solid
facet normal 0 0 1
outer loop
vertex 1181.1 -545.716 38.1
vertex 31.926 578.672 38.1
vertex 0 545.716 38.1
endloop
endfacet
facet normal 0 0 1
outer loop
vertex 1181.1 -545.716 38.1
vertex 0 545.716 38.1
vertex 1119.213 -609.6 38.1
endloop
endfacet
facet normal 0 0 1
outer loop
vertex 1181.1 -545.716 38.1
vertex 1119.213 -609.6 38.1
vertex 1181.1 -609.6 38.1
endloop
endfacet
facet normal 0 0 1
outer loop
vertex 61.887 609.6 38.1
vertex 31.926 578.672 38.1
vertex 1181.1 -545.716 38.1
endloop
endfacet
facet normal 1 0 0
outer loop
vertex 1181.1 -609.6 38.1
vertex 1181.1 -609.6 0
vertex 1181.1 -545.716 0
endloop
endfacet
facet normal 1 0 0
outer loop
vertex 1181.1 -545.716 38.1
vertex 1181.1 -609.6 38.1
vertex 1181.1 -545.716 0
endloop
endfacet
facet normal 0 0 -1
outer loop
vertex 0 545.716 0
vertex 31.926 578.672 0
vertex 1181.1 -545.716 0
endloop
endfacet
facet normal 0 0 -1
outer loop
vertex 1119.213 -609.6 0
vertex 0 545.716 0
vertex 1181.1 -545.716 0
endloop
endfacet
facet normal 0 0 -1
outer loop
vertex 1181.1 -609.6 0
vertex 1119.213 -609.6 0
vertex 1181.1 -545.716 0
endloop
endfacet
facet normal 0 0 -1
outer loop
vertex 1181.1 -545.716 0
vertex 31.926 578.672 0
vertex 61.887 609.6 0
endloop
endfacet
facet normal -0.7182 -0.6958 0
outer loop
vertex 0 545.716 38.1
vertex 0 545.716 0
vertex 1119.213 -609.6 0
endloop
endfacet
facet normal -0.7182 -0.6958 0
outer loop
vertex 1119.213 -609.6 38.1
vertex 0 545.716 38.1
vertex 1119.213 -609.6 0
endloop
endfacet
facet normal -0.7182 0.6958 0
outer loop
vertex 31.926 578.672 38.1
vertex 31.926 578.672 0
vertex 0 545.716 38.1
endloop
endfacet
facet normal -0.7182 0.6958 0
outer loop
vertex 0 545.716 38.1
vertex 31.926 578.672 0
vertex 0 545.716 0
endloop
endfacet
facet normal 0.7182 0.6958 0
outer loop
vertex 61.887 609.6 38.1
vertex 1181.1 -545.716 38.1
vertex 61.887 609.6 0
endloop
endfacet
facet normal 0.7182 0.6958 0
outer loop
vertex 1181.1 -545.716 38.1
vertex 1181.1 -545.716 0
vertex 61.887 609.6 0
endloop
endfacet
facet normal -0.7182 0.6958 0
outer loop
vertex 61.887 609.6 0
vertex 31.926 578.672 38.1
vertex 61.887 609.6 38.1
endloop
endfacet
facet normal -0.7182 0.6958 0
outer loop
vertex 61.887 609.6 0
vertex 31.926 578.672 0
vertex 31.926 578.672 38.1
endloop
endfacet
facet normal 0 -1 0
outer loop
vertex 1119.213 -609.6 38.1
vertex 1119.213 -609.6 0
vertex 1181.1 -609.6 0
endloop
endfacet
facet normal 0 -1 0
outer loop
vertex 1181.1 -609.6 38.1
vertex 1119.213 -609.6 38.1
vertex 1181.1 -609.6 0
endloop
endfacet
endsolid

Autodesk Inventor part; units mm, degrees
ref_plane "YZ Plane" through (0, 0, 0) normal (1, 0, 0) x (0, 1, 0)
ref_plane "XZ Plane" through (0, 0, 0) normal (0, 1, 0) x (-1, 0, 0)
ref_plane "XY Plane" through (0, 0, 0) normal (0, 0, 1) x (1, 0, 0)
sketch "Sketch1" plane through (0, 0, 0) normal (0, 0, 1) x (1, 0, 0)
  line L0 (-1181.1, -609.6) -> (1181.1, -609.6)
  line L1 (1181.1, -609.6) -> (1181.1, 609.6)
  line L2 (1181.1, 609.6) -> (-1181.1, 609.6)
  line L3 (-1181.1, 609.6) -> (-1181.1, -609.6)
  line L4 (-1181.1, -609.6) -> (1181.1, 609.6) construction
  line L5 (1181.1, -609.6) -> (-1181.1, 609.6) construction
  line L6 (0, 609.6) -> (0, -609.6)
  line L7 (0, 609.6) -> (1181.1, -609.6)
  line L8 (-31.9258, 578.6719) -> (31.9258, 640.5281)
  line L9 (1149.1742, -640.5281) -> (1213.0258, -578.6719)
  line L10 (-31.9258, 578.6719) -> (1149.1742, -640.5281)
  line L11 (1213.0258, -578.6719) -> (31.9258, 640.5281)
  line L12 (-31.9258, 578.6719) -> (-61.8874, 609.6)
  line L13 (1181.1, -609.6) -> (-1181.1, 609.6) construction
  line L14 (0, 609.6) -> (-1181.1, -609.6)
  line L15 (31.9258, 578.6719) -> (-31.9258, 640.5281)
  line L16 (-1149.1742, -640.5281) -> (-1213.0258, -578.6719)
  line L17 (31.9258, 578.6719) -> (-1149.1742, -640.5281)
  line L18 (-1213.0258, -578.6719) -> (-31.9258, 640.5281)
  line L19 (31.9258, 578.6719) -> (61.8874, 609.6)
  point P0 (0, 0)
  point P1 (-1181.1, -545.7163)
  point P2 (-1119.2126, -609.6)
  point P3 (61.8874, 609.6)
  point P4 (0, 545.7163)
  point P5 (1119.2126, -609.6)
  point P6 (1181.1, -545.7163)
  point P7 (61.8874, 609.6)
  dimension "d0" = 2362.2
  dimension "d1" = 1219.2
  dimension "d3" = 88.9
  dimension "d4" = 88.9
extrude "Extrusion1" add sketch "Sketch1" along normal blind 38.1 contours L17 L7 L0 L10 | L17 L19 L11 L1 L7
properties part number "S_2x4x65.081"
